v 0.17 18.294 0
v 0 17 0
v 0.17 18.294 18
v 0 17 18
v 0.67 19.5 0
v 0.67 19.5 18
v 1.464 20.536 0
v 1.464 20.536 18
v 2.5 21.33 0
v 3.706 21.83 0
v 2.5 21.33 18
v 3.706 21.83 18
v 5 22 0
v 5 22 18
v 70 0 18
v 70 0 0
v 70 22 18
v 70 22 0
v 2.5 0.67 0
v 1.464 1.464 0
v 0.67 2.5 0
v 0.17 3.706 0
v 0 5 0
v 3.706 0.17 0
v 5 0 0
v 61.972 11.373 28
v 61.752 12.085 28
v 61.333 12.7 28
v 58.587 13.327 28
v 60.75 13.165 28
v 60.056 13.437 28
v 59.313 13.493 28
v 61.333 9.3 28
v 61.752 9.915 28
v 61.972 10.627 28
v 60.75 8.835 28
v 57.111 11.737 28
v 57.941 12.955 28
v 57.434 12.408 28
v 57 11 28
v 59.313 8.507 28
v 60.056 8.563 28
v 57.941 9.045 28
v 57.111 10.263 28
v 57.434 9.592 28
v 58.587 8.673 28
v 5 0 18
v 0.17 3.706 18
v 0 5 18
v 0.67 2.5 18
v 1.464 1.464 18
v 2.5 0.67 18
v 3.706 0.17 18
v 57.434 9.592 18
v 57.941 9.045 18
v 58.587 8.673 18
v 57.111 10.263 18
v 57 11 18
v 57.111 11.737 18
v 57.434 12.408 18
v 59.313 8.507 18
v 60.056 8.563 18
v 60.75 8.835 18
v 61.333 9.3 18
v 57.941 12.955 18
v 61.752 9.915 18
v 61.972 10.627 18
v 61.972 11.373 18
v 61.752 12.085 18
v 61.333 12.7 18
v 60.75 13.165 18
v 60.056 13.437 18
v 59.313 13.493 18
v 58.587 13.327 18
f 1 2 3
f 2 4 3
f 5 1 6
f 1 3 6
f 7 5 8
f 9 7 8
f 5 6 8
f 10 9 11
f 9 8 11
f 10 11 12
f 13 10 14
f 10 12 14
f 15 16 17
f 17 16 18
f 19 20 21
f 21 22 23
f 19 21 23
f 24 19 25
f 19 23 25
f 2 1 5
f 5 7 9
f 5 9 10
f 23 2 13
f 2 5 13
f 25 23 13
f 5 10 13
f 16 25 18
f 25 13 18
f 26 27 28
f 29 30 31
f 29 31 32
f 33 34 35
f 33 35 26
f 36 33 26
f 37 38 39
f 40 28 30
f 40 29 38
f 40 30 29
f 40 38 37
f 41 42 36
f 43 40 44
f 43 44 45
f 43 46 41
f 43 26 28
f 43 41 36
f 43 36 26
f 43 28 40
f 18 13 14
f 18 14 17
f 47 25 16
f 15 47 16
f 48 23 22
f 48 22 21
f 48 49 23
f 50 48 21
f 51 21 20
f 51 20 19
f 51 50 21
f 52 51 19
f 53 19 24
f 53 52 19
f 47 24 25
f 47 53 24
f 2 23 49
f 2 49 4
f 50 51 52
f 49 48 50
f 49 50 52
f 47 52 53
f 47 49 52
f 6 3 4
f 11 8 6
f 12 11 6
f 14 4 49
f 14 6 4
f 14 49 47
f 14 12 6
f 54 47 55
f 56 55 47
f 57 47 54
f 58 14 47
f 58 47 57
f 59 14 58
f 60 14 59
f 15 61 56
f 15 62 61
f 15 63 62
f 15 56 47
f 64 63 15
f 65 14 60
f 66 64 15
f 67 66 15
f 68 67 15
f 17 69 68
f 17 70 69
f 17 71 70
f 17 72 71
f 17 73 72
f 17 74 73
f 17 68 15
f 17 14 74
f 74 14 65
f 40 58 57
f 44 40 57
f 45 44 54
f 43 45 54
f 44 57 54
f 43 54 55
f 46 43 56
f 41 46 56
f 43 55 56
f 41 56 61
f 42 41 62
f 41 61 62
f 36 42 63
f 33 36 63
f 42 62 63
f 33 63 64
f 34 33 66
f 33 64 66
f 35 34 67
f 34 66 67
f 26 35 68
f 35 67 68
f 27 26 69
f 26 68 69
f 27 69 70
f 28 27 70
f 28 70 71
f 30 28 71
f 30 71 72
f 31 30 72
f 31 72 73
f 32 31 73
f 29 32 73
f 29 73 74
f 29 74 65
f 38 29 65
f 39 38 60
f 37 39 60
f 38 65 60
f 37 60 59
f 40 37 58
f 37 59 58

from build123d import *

# Parameters (mm, degrees)
CROQUIS1_W              = 70
CROQUIS1_H              = 22
SALIENTE_EXTRUIR1_DEPTH = 18
CROQUIS2_R              = 2.5
SALIENTE_EXTRUIR2_DEPTH = 10
REDONDEO3_R             = 5
REDONDEO4_R             = 5


with BuildPart() as part:
    # Croquis1 → Saliente-Extruir1 (new body)
    with BuildSketch(Plane.XY):
        with Locations((35, 11)):
            Rectangle(CROQUIS1_W, CROQUIS1_H)
    extrude(amount=SALIENTE_EXTRUIR1_DEPTH)

    # Croquis2 → Saliente-Extruir2 (add)
    with BuildSketch(Plane.XY.offset(18)):
        with Locations(Location((59.5, 11, 0), (0, 0, 180))):
            Circle(CROQUIS2_R)
    extrude(amount=SALIENTE_EXTRUIR2_DEPTH)

    # Redondeo3
    redondeo3_edges = [part.edges().sort_by_distance(p)[0] for p in [
        (0, 22, 9),
    ]]
    fillet(redondeo3_edges, radius=REDONDEO3_R)

    # Redondeo4
    redondeo4_edges = [part.edges().sort_by_distance(p)[0] for p in [
        (0, 0, 9),
    ]]
    fillet(redondeo4_edges, radius=REDONDEO4_R)


solid = part.part
